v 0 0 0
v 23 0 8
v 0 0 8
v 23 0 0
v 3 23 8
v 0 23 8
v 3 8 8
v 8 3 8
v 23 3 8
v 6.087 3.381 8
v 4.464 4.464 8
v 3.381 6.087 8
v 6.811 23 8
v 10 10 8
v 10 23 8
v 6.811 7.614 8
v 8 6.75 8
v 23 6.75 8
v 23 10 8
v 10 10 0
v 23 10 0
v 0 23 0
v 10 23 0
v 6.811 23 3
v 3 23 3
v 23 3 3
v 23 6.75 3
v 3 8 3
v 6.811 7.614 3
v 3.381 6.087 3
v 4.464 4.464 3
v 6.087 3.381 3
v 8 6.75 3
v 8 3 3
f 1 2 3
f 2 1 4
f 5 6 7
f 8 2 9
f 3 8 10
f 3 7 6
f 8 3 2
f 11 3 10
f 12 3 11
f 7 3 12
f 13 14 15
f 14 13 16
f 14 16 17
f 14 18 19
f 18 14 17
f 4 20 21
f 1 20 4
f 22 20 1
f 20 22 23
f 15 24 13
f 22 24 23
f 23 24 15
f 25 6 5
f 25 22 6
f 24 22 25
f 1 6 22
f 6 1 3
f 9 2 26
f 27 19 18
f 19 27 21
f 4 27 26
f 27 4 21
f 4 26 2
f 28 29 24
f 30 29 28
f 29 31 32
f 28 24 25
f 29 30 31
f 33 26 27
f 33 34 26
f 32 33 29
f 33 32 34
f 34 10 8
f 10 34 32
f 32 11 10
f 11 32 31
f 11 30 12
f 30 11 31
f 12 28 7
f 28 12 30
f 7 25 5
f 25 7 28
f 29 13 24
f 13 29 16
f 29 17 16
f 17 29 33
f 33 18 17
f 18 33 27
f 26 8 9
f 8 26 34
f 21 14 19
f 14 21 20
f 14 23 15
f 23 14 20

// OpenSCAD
// Print the size tester or the full bracket? Start with the Size Tester.
part = "test"; // [test:Size Tester,bracket:Camera Bracket]

// How wide should the groove be for the bed wing? Print Sizer Tester objects until you find a good value for this number. You want a fit that slides on with a tiny amount of force, without scratching and stays there.
cut_thickness = 3.75;

/* [Hidden] */

// How big is the mounting bracket when seen from the front of the
// machine?
outer_size = 23;

// Any small value used to slightly offset faces when
// using difference() to avoid artifacting.
epsilon = 1;

if (part == "bracket") {
    bed_corner_mount(cut_thickness=cut_thickness);

    clip_to_top(outer_size)
    move_to_top(outer_size)
    camera_tab();
    
    // I'd like to try this in a later version.
    //c525_camera_box();
} else {
    bed_corner_mount(cut_thickness=cut_thickness, cut_depth=5);    
}


// A single, flat tab to which the camera can be attached using rubber
// bands.
module camera_tab() {
    tab_thickness = 3;
    tab_height = 20;
    tab_length = outer_size * sqrt(2);
    
    translate([0, -tab_thickness/2, 0])
    cube([tab_length, tab_thickness, tab_height]);
}

// Holds the lower articulation a Logitech C525 webcam.  This is an
// an excellent camera for this application, because it can focus on
// objects as close as 7cm, and it has both rotation and position
// adjustments.
module c525_camera_box(x=60, y=7, depth=20) {
    wall_thickness = 3;
    translate([0, -(y+2*wall_thickness)/2, 0])
    linear_extrude(depth)
    difference() {
        square([x+2*wall_thickness, y+2*wall_thickness]);
        
        translate([wall_thickness, wall_thickness])
        square([x, y]);
    }
}

// Slides nicely onto the right bed corner of a Printrbot Simple Metal.
module bed_corner_mount(cut_thickness=3.75, cut_depth=25) {
    depth = cut_depth + 3;

    outer_size = 23;
    cut_size = 20;
    inner_size = 12;
    
    cut_radius = 5;

    translate([outer_size, outer_size, 0])
    mirror([1, 1, 0])
    difference() {
        // Our main block.
        cube([outer_size, outer_size, depth]);
        
        // Cut our groove.
        translate([-epsilon, -epsilon, depth-cut_depth])
        linear_extrude(cut_depth+epsilon)
        bent_sheet(cut_size+epsilon,
                   radius=cut_radius,
                   thickness=cut_thickness);
        
        // Cut out an inside block
        translate([-epsilon, -epsilon, -epsilon])
        cube([inner_size+2*epsilon, inner_size+2*epsilon, depth+2*epsilon]);
    }
}

// Move something from the x, y plane to the top of the bracket.
module move_to_top(outer_size) {
    translate([0, outer_size, 0])
    rotate([45, 0, 0])
    rotate([0, -90, 0])
    children();
}

// Clip a part to fit within the aispace on top of the bracket.
module clip_to_top(outer_size) {
    airspace = 50;
    intersection() {
        translate([-airspace, 0, 0])
        cube([airspace, outer_size, outer_size]);

        children();
    }
}    

// A square with one rounded corner at the upper right.
module round_corner_square(size, radius) {
    intersection() {
        square(size);

        translate([-radius,-radius])
        minkowski() {
            square(size);
            circle(radius);
        }
    }
}

// Simulates a bent steel sheeet with the rounded corner at the upper
// right.
module bent_sheet(size, radius, thickness) {
    difference() {
        round_corner_square(size, radius);
        
        translate([-thickness, -thickness])
        round_corner_square(size, max(1, radius-thickness));
    }
}
